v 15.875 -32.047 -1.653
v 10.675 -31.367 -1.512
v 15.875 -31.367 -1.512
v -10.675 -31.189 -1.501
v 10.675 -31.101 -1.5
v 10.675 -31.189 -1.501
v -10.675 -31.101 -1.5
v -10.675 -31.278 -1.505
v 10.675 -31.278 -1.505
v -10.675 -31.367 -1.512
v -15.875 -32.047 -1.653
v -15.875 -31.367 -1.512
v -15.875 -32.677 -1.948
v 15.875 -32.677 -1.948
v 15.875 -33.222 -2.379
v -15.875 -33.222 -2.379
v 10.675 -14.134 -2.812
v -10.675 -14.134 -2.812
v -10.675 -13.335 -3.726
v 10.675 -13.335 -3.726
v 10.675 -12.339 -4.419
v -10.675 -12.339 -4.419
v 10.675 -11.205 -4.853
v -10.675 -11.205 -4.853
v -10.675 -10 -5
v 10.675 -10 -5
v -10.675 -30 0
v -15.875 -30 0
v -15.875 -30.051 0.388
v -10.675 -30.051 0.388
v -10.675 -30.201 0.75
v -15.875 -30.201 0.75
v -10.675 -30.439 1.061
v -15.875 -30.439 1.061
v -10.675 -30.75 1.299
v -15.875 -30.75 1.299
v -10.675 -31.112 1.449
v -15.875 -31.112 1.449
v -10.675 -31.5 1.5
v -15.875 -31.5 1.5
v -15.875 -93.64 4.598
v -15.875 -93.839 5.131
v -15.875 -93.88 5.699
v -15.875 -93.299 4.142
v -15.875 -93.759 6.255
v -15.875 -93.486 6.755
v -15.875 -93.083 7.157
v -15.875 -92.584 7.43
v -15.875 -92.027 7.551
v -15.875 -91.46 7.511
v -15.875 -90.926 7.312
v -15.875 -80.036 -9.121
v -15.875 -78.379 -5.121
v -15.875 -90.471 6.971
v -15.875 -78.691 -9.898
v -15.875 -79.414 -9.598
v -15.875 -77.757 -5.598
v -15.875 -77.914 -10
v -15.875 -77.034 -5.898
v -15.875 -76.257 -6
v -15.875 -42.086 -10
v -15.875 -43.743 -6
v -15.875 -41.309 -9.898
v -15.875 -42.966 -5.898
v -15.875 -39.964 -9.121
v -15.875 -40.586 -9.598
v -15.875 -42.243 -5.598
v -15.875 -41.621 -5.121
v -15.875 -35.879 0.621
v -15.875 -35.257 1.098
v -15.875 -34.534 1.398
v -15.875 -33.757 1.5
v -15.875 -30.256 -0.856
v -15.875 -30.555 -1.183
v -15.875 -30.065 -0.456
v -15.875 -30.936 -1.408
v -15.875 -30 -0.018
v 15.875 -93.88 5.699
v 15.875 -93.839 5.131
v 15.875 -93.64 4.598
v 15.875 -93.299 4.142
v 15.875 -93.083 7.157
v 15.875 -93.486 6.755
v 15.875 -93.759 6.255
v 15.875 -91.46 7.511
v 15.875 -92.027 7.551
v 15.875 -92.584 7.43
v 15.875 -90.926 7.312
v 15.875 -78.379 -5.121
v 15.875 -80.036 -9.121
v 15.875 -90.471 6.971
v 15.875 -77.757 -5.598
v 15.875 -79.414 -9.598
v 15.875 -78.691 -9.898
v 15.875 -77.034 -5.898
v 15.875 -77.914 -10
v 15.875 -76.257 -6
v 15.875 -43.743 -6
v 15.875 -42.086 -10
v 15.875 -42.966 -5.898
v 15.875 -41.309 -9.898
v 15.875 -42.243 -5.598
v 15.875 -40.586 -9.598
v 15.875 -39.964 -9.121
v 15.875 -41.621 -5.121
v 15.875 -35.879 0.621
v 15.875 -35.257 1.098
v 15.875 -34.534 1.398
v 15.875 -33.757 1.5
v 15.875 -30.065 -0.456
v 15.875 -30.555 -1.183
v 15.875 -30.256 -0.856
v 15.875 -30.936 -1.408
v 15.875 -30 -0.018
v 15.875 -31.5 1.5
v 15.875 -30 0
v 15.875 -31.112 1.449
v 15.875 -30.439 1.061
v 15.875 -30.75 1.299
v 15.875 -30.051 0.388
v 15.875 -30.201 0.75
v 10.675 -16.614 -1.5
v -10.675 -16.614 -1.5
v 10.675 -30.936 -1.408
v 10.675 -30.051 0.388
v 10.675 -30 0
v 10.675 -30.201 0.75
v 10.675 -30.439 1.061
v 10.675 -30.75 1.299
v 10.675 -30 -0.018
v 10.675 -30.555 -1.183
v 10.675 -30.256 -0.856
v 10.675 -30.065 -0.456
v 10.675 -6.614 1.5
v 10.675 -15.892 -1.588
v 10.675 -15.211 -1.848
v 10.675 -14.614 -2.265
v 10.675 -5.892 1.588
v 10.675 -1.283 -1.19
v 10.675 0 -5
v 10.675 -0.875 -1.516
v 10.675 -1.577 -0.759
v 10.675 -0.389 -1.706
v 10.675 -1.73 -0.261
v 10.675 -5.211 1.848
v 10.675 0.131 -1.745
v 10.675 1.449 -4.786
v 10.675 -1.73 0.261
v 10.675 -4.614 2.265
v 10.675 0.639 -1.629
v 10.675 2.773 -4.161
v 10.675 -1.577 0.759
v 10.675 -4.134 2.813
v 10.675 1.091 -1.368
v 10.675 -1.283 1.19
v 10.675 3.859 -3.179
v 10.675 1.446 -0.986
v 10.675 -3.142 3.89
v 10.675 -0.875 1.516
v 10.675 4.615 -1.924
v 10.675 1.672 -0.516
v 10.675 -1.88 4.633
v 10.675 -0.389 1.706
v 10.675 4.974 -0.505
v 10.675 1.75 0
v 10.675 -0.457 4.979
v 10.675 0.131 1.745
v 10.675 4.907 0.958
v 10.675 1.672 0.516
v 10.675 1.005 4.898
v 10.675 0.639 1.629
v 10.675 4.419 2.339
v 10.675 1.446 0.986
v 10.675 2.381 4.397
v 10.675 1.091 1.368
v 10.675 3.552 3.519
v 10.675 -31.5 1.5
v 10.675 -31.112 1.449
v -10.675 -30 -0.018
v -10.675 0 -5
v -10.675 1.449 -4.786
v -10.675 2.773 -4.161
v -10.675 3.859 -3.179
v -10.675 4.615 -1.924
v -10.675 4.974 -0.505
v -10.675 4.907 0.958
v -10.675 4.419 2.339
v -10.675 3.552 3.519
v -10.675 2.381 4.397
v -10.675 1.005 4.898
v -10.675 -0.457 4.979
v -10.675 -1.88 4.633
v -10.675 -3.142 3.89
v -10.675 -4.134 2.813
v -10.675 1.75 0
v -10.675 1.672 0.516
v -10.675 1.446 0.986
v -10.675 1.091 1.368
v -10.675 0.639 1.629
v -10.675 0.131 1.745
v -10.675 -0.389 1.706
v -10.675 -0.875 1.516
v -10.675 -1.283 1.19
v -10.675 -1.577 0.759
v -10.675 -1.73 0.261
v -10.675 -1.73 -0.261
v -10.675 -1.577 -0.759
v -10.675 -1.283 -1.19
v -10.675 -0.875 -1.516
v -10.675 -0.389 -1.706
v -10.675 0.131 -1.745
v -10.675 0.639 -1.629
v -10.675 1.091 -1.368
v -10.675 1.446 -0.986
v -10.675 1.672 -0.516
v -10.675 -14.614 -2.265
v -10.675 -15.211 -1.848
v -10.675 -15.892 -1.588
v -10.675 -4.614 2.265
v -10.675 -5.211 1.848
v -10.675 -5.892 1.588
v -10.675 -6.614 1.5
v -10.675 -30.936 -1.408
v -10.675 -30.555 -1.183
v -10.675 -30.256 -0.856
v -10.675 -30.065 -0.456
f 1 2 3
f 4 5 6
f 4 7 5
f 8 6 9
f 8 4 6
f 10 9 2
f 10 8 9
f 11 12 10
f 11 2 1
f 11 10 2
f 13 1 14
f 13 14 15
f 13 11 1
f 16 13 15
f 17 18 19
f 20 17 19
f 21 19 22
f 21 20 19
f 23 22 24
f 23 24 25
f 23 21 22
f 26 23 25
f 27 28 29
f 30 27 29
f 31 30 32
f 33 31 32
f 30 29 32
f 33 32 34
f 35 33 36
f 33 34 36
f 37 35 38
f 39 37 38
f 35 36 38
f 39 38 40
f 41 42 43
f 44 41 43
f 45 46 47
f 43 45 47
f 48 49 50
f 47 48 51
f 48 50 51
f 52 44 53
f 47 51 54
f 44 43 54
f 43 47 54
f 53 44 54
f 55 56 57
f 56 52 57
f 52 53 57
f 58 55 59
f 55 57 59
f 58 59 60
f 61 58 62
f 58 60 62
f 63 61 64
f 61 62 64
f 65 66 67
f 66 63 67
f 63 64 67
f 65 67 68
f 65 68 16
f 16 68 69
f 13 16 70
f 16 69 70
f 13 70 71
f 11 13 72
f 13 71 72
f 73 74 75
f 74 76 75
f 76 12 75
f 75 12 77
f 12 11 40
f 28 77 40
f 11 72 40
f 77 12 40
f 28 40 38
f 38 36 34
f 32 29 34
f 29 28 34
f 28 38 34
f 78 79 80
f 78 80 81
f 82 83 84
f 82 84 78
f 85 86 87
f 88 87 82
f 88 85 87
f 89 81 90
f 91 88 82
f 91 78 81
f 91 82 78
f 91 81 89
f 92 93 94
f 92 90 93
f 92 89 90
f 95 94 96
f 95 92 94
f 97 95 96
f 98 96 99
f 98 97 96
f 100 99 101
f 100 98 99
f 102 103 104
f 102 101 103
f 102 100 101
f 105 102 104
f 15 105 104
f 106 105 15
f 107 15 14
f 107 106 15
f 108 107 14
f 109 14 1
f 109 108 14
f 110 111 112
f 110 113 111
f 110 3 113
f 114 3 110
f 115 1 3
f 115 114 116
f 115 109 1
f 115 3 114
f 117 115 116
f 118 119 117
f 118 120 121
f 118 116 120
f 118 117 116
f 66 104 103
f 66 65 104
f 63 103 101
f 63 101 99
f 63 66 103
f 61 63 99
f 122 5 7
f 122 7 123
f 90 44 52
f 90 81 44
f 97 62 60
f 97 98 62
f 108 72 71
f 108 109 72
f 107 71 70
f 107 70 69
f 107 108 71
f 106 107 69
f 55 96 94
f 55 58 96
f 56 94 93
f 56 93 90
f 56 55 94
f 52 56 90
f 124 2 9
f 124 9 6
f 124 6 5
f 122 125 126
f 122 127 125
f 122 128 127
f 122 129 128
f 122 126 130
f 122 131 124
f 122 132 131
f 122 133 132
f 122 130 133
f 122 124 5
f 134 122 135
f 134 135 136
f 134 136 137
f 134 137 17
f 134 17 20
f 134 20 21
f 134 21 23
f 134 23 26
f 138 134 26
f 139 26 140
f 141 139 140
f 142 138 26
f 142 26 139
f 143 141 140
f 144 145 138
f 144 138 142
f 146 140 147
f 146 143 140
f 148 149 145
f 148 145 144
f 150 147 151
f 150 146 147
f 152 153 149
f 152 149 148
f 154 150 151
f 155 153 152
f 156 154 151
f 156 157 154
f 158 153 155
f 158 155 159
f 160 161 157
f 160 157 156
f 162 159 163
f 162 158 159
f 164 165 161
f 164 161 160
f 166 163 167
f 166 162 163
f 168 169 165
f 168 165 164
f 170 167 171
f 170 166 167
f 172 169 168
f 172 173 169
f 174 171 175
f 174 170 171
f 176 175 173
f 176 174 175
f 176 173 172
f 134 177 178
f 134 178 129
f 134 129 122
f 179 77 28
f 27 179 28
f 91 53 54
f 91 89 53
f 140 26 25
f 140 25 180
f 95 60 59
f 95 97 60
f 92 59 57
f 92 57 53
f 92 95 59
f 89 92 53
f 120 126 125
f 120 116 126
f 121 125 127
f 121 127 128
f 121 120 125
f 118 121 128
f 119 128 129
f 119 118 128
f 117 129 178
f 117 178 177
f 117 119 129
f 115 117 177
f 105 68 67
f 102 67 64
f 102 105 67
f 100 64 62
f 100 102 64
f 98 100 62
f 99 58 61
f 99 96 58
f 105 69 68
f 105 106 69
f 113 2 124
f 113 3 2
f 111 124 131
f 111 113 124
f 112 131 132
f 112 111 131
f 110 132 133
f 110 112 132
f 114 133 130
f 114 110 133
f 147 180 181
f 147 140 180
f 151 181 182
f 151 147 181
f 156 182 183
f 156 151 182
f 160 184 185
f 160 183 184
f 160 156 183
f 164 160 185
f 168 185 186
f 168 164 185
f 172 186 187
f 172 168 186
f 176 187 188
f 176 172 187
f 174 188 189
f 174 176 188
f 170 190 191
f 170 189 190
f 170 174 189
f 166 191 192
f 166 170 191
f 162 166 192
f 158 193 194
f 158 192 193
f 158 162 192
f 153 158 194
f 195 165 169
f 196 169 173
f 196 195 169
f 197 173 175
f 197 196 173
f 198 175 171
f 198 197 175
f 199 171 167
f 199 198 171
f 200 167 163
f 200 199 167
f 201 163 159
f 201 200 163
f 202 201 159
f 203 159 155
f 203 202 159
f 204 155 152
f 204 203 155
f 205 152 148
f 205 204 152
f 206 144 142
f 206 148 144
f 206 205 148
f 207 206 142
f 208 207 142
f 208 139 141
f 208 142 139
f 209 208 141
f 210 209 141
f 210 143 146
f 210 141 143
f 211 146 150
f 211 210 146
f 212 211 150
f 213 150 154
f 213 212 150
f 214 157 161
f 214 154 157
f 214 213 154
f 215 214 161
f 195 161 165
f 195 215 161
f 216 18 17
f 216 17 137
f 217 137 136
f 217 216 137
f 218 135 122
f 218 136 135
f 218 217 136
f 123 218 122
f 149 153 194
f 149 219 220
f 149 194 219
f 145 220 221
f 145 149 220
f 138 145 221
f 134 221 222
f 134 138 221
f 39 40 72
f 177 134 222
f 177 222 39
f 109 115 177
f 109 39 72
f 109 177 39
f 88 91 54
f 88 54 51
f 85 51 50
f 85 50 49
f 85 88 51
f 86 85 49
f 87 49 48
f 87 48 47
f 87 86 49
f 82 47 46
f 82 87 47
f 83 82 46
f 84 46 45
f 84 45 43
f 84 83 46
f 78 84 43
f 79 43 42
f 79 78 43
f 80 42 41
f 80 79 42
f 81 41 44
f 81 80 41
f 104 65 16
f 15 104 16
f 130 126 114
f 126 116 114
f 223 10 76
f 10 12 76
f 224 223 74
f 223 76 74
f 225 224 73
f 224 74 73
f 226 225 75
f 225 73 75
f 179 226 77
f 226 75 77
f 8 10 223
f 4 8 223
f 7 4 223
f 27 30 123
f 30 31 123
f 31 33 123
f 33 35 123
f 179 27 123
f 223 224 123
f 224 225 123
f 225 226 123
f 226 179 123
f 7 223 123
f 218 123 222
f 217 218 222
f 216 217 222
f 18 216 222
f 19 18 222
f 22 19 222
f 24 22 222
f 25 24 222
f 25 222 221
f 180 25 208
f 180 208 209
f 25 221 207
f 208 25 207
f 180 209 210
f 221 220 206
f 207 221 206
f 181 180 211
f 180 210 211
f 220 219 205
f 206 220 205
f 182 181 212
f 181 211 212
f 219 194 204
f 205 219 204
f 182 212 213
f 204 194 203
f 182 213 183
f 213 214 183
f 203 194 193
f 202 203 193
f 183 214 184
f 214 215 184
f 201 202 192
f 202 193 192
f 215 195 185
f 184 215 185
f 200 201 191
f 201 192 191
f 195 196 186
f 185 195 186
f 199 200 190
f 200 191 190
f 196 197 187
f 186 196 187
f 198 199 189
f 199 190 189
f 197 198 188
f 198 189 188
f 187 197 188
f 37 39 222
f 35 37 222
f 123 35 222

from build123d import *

# Parameters (mm, degrees)
F0_R          = 1.75
F1_DEPTH      = 15.875
F3_DEPTH      = 31.75
F4_R          = 3
F5_W          = 5
F5_H          = 35
F6_DEPTH      = 10.001
F6_DEPTH_BACK = 7.5573491861
F7_T1_DEPTH   = 8.7055800262
F7_T3_DEPTH   = 8.75
F7_T5_DEPTH   = 8.75
F7_T7_DEPTH   = 8.7055800262
F8_DEPTH      = 0.2
F9_DEPTH      = 0.2


# Not quite as in the source:
# - a fillet or chamfer that OpenCascade refuses, or shapes differently, is made with other operations: its cross-section is extruded or revolved along the edge and cut away or added


with BuildPart() as f1:
    # F0 (on Right) → F1 (new body, symmetric)
    with BuildSketch(Plane.YZ):
        with BuildLine():
            Line((-5.2303039929, -1.5), (-4.7696960071, -1.5))
            ThreePointArc((-4.7696960071, -1.5), (5, 0), (-4.7696960071, 1.5))
            Line((-4.7696960071, 1.5), (-35, 1.5))
            Line((-35, 1.5), (-42.5, -6))
            Line((-42.5, -6), (-77.5, -6))
            Line((-77.5, -6), (-90.4705627485, 6.9705627485))
            ThreePointArc((-90.4705627485, 6.9705627485), (-93.2989898732, 6.9705627485), (-93.2989898732, 4.1421356237))
            Line((-93.2989898732, 4.1421356237), (-79.1568542495, -10))
            Line((-79.1568542495, -10), (-40.8431457505, -10))
            Line((-40.8431457505, -10), (-32.3431457505, -1.5))
            Line((-32.3431457505, -1.5), (-14.7696960071, -1.5))
            ThreePointArc((-14.7696960071, -1.5), (-10, -5), (-5.2303039929, -1.5))
        make_face()
        Circle(F0_R, mode=Mode.SUBTRACT)
    extrude(amount=F1_DEPTH, both=True)

    # F2 (on face) → F3 (join, through all)
    with BuildSketch(Plane.YZ.offset(15.875)):
        with BuildLine():
            ThreePointArc((-5.2303039929, -1.5), (-7.0419601085, -4.0311288741), (-10, -5))
            Line((-10, -5), (0, -5))
            ThreePointArc((0, -5), (-2.9580398915, -4.0311288741), (-4.7696960071, -1.5))
            Line((-4.7696960071, -1.5), (-5.2303039929, -1.5))
        make_face()
    extrude(amount=-F3_DEPTH)

    # F4
    f4_edges = [f1.edges().sort_by_distance(p)[0] for p in [
        (0, -4.769696, 1.5),
        (0, -14.769696, -1.5),
        (0, -77.5, -6),
        (0, -79.156854, -10),
        (0, -40.843146, -10),
        (0, -32.343146, -1.5),
        (0, -42.5, -6),
        (0, -35, 1.5),
    ]]
    fillet(f4_edges, radius=F4_R)

    # F5 (on Top) → F6 (cut, two sides)
    with BuildSketch(Plane.XY) as f6_sk:
        with Locations((-13.375, -12.5)):
            Rectangle(F5_W, F5_H)
        with Locations((13.375, -12.5)):
            Rectangle(F5_W, F5_H)
    extrude(amount=-F6_DEPTH, mode=Mode.SUBTRACT)
    extrude(f6_sk.sketch, amount=F6_DEPTH_BACK, mode=Mode.SUBTRACT)

    # F7: fillet of radius 1.5 on 4 edges, made by hand

    # F7_s2 → F7_t1 (cut)
    with BuildSketch(Plane.YZ.offset(10.875)):
        with BuildLine():
            ThreePointArc((-31.3668350211, -1.5118453264), (-30.3932598615, -1.0302531824), (-30, -0.0177679895))
            Line((-30, -0.0177679895), (-29.85, -0.0177679895))
            Line((-29.85, -0.0177679895), (-29.85, -1.5))
            Line((-29.85, -1.5), (-30, -1.65))
            ThreePointArc((-30, -1.65), (-31.1005050634, -1.65), (-31.3535185232, -1.66125306))
            Line((-31.3535185232, -1.66125306), (-31.3668350211, -1.5118453264))
        make_face()
    extrude(amount=F7_T1_DEPTH, mode=Mode.SUBTRACT)

    # F7_s4 → F7_t3 (cut)
    with BuildSketch(Plane.YZ.offset(10.875)):
        with BuildLine():
            ThreePointArc((-30, 0), (-30.4393398282, 1.0606601718), (-31.5, 1.5))
            Line((-31.5, 1.5), (-30, 1.5))
            Line((-30, 1.5), (-30, 0))
        make_face()
    extrude(amount=F7_T3_DEPTH, mode=Mode.SUBTRACT)

    # F7_s6 → F7_t5 (cut)
    with BuildSketch(Plane.YZ.offset(-19.625)):
        with BuildLine():
            ThreePointArc((-30, 0), (-30.4393398282, 1.0606601718), (-31.5, 1.5))
            Line((-31.5, 1.5), (-30, 1.5))
            Line((-30, 1.5), (-30, 0))
        make_face()
    extrude(amount=F7_T5_DEPTH, mode=Mode.SUBTRACT)

    # F7_s8 → F7_t7 (cut)
    with BuildSketch(Plane.YZ.offset(-19.5805800262)):
        with BuildLine():
            ThreePointArc((-31.3668350211, -1.5118453264), (-30.3932598615, -1.0302531824), (-30, -0.0177679895))
            Line((-30, -0.0177679895), (-29.85, -0.0177679895))
            Line((-29.85, -0.0177679895), (-29.85, -1.5))
            Line((-29.85, -1.5), (-30, -1.65))
            ThreePointArc((-30, -1.65), (-31.1005050634, -1.65), (-31.3535185232, -1.66125306))
            Line((-31.3535185232, -1.66125306), (-31.3668350211, -1.5118453264))
        make_face()
    extrude(amount=F7_T7_DEPTH, mode=Mode.SUBTRACT)

    # F8 (cut): a face of the model
    f8_faces = [f1.faces().sort_by_distance(p)[0] for p in [
        (10.875, -9.1101781633, -0.6280033564),
    ]]
    extrude(f8_faces, amount=-F8_DEPTH, mode=Mode.SUBTRACT)

    # F9 (cut): a face of the model
    f9_faces = [f1.faces().sort_by_distance(p)[0] for p in [
        (-10.875, -9.1101781633, -0.6280033564),
    ]]
    extrude(f9_faces, amount=-F9_DEPTH, mode=Mode.SUBTRACT)


solid = f1.part
